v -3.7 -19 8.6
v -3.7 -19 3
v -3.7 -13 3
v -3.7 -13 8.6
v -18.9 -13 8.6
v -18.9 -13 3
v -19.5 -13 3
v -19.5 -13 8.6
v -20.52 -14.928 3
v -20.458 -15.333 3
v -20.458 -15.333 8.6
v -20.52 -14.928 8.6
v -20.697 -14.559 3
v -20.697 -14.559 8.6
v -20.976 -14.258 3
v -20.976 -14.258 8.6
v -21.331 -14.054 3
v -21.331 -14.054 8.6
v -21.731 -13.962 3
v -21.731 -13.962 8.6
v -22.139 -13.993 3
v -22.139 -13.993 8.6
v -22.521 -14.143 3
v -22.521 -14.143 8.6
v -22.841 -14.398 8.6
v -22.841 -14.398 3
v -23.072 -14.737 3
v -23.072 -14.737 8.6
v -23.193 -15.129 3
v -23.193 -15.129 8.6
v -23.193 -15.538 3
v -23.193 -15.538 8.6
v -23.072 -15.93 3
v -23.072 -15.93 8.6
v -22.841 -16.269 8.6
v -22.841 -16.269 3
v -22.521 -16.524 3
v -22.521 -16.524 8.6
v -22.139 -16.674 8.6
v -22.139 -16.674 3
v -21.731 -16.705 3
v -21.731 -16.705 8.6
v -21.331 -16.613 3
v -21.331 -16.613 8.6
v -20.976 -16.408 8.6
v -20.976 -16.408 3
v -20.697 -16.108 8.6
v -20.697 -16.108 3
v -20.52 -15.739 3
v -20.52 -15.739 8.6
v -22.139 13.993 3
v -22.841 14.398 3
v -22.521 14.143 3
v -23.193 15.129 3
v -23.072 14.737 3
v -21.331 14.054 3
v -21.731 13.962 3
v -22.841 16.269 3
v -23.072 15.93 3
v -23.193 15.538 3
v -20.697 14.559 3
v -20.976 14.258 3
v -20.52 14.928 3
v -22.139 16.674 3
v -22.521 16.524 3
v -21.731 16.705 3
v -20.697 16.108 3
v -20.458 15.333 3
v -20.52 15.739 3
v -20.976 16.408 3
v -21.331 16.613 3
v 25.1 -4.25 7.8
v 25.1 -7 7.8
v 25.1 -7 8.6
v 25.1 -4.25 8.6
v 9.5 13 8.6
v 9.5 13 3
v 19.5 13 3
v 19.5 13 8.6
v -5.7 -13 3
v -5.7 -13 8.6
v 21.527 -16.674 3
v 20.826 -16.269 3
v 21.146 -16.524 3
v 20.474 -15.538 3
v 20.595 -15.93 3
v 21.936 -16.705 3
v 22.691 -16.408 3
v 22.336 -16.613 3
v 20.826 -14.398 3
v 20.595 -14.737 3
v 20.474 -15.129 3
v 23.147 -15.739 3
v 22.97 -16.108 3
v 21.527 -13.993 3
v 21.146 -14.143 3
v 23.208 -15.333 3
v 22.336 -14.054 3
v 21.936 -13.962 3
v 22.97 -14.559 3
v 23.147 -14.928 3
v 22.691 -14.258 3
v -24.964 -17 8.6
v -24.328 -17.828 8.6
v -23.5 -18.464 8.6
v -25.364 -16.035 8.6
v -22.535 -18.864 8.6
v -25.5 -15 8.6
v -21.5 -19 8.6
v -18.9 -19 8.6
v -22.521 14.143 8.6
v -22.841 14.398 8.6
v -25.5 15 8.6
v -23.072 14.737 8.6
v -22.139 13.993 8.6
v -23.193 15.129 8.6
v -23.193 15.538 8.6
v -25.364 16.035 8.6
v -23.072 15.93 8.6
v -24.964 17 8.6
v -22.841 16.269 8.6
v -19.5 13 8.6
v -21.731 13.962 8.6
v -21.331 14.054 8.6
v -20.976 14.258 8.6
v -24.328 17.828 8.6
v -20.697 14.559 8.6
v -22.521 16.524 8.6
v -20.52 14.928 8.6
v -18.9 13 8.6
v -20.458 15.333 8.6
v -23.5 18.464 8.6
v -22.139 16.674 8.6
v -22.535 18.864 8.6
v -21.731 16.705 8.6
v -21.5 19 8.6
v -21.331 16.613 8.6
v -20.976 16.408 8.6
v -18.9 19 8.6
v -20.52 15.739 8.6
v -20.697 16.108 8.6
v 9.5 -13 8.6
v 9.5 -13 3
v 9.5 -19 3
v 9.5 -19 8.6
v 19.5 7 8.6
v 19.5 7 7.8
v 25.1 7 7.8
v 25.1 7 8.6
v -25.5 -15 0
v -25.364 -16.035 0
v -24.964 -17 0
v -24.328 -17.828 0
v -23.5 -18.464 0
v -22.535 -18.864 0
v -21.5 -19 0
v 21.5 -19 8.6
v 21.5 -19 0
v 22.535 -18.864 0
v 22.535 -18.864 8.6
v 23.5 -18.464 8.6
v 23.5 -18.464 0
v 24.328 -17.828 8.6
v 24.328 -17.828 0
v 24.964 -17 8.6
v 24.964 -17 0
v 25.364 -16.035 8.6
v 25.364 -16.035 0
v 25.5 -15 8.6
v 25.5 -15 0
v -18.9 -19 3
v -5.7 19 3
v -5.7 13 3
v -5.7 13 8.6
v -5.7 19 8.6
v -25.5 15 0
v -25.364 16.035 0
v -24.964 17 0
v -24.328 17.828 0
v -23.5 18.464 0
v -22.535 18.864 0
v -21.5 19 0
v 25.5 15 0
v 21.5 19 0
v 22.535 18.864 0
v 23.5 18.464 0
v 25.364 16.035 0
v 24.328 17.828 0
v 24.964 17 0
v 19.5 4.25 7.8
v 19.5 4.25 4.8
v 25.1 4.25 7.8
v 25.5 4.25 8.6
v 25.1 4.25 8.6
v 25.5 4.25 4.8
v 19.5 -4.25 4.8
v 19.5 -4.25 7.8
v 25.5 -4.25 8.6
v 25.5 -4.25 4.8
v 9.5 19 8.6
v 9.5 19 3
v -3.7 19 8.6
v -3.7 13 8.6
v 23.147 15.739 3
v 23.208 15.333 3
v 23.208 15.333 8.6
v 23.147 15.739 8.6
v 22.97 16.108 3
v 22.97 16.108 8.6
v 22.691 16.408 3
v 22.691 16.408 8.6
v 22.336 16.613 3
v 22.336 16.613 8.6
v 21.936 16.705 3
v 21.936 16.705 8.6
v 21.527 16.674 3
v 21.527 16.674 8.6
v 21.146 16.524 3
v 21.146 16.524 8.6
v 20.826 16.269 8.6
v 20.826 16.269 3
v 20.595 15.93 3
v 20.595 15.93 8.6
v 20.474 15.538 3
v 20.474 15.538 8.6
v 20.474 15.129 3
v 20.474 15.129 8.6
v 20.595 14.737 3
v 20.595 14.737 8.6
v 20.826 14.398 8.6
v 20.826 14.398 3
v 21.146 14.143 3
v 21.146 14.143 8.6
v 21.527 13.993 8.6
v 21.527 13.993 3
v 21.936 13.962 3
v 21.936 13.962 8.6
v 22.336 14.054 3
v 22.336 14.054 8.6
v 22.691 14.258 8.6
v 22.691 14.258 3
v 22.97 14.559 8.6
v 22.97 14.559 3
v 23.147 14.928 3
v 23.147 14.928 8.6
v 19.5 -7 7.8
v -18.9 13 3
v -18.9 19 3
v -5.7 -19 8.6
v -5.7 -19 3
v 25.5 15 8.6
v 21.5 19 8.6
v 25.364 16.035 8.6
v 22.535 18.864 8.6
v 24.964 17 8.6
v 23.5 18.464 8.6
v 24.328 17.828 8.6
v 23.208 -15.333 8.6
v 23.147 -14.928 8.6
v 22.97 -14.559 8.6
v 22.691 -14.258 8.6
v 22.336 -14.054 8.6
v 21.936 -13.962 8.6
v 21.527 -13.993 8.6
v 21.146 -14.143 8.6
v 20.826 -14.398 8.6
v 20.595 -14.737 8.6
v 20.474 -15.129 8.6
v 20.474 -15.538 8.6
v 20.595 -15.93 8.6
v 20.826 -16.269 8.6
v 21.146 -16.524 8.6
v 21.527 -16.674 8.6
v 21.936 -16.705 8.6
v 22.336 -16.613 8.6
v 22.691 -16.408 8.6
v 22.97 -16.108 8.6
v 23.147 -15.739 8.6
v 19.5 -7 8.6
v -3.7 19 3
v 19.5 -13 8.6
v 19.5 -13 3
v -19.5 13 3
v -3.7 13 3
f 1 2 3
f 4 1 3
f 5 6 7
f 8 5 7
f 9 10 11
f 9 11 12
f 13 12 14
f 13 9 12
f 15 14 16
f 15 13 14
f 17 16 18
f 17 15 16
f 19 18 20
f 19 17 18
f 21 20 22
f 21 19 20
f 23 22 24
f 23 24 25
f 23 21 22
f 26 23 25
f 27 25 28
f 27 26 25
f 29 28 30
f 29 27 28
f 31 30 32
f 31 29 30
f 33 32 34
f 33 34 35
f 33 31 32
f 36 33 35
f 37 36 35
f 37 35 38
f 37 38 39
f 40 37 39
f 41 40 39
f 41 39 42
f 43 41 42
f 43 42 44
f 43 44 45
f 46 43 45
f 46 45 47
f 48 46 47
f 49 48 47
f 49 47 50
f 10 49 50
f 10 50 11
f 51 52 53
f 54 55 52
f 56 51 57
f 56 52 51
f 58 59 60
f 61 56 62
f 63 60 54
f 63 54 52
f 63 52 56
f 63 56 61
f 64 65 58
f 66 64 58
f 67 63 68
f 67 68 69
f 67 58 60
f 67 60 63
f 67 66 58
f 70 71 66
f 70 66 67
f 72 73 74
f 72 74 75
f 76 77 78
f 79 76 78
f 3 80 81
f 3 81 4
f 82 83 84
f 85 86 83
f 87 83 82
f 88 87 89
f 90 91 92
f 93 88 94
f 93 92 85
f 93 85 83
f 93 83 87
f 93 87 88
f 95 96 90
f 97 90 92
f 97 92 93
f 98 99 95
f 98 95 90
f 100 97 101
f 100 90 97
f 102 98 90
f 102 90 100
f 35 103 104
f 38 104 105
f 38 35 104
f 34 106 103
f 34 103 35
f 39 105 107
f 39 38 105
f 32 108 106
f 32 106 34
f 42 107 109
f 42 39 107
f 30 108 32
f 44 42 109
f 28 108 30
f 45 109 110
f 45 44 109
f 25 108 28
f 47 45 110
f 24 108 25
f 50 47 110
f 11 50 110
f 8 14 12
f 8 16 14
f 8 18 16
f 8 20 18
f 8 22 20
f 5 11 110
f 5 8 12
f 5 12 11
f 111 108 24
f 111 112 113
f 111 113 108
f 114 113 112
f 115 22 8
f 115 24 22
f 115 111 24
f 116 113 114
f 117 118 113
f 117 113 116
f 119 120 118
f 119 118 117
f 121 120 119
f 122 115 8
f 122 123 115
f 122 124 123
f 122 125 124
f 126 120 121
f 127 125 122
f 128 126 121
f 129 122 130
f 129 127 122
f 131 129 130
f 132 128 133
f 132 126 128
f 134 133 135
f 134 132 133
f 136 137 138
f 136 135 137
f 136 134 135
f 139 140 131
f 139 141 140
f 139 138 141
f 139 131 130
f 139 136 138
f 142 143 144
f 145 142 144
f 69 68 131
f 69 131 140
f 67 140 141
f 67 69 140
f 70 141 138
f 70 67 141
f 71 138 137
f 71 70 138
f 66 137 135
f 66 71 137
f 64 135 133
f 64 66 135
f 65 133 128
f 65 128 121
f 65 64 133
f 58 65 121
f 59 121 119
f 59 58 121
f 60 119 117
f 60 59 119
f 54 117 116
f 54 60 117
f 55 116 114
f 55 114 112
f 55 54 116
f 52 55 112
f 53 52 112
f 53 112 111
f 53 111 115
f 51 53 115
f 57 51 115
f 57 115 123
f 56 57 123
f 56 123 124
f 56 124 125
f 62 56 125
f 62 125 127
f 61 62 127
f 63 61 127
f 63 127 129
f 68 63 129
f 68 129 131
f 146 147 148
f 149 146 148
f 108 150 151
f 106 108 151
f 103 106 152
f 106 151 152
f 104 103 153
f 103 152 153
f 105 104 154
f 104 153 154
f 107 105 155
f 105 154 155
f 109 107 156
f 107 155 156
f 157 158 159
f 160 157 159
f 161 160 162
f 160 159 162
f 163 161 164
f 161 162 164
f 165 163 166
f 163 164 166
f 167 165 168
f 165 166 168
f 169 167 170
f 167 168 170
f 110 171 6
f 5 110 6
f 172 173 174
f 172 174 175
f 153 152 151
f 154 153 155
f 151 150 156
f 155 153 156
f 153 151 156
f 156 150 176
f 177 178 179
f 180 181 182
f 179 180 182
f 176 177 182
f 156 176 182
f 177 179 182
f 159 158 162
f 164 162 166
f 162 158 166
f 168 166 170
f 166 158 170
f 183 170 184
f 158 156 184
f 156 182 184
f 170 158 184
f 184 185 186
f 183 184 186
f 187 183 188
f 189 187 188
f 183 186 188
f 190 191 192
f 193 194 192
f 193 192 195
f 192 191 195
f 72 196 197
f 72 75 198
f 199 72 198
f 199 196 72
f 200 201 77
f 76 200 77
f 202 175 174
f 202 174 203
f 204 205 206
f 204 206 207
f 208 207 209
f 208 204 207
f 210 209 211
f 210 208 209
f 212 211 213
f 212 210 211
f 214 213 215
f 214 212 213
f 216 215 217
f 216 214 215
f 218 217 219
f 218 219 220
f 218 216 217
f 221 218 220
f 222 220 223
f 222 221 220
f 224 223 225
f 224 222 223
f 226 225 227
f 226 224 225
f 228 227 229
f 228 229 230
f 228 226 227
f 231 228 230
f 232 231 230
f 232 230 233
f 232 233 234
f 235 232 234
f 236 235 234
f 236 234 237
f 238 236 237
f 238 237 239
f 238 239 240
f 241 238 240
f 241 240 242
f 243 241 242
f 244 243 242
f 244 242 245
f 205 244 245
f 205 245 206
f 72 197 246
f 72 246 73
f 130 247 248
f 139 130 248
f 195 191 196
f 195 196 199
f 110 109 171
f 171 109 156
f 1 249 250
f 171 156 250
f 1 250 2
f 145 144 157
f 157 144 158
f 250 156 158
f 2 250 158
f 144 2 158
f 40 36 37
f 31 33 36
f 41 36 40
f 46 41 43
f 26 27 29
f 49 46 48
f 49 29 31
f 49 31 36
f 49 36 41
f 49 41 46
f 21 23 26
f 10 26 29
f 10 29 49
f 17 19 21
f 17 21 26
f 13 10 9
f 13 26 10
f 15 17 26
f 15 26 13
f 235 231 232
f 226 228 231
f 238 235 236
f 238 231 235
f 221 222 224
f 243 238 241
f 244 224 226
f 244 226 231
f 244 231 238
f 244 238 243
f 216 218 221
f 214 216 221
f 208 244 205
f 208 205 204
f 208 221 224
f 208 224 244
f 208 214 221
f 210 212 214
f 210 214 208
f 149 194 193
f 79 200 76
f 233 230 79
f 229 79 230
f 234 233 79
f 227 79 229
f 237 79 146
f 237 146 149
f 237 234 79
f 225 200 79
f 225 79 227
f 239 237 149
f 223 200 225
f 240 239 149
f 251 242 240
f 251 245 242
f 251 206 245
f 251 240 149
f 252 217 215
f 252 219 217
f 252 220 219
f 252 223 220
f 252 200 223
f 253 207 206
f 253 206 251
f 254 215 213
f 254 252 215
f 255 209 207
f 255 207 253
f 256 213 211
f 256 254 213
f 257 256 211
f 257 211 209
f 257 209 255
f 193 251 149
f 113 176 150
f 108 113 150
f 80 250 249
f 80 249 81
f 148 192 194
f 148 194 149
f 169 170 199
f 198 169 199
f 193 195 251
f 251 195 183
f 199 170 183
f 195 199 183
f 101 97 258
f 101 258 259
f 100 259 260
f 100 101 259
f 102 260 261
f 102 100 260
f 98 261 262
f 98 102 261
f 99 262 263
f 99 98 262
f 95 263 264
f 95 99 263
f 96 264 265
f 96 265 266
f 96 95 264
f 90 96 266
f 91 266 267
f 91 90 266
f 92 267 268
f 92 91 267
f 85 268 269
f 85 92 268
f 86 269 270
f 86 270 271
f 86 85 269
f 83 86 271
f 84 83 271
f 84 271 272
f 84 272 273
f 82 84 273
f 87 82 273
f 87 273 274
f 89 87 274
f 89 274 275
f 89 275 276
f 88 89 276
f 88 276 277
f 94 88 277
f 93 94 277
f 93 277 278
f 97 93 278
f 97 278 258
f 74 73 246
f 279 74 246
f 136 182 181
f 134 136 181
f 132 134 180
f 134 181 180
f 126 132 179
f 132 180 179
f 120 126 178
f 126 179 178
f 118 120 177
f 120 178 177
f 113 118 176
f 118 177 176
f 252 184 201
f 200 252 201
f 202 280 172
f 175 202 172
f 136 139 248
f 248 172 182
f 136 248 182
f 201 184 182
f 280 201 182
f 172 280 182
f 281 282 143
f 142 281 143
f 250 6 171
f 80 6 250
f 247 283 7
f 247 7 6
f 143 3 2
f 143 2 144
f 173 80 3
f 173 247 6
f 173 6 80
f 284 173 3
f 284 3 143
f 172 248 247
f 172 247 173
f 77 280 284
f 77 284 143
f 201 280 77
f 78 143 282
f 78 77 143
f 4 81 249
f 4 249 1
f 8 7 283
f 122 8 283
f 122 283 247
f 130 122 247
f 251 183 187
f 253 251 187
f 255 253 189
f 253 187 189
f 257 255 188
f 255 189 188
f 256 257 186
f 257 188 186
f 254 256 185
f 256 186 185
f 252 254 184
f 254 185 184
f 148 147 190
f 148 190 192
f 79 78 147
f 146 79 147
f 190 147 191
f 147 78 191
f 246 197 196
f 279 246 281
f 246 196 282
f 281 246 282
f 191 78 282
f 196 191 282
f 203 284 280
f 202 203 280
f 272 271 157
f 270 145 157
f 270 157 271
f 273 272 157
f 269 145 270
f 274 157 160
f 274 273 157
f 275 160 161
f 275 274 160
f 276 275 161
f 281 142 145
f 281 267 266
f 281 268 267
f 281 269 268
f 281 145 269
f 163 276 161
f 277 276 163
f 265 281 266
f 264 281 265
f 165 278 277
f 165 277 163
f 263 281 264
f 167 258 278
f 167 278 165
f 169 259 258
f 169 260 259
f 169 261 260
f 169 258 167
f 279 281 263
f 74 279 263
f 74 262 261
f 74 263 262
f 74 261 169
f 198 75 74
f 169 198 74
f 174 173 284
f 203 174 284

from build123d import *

# Parameters (mm, degrees)
F0_R     = 2.6
F0_W     = 13.2
F0_H     = 6
F0_W_2   = 5.6
F0_H_2   = 8.5
F0_R_2   = 1.55
F0_H_3   = 2.75
F0_W_3   = 2
F0_R_3   = 1.375
F0_W_4   = 0.4
F1_DEPTH = 3
F2_DEPTH = 8.6
F3_DEPTH = 7.8
F4_DEPTH = 4.8


with BuildPart() as f1:
    # F0 (on Top) → F1 (new body)
    with BuildSketch(Plane.XY):
        Polygon((19.5, 13), (9.5, 13), (-3.7, 13), (-5.7, 13), (-18.9, 13), (-19.5, 13), (-19.5, -13), (-18.9, -13), (-5.7, -13), (-3.7, -13), (9.5, -13), (19.5, -13), (19.5, -7), (19.5, -4.25), (19.5, 4.25), (19.5, 7), align=None)
        with BuildLine():
            Line((-18.9, 13), (-18.9, 19))
            Line((-18.9, 19), (-21.5, 19))
            ThreePointArc((-21.5, 19), (-24.3284271247, 17.8284271247), (-25.5, 15))
            Line((-25.5, 15), (-25.5, -15))
            ThreePointArc((-25.5, -15), (-24.3284271247, -17.8284271247), (-21.5, -19))
            Line((-21.5, -19), (-18.9, -19))
            Line((-18.9, -19), (-18.9, -13))
            Line((-18.9, -13), (-19.5, -13))
            Line((-19.5, -13), (-19.5, 13))
            Line((-19.5, 13), (-18.9, 13))
        make_face()
        with Locations((-21.8334523779, -15.3334523779)):
            Circle(F0_R, mode=Mode.SUBTRACT)
        with Locations((-21.8334523779, 15.3334523779)):
            Circle(F0_R, mode=Mode.SUBTRACT)
        with BuildLine():
            Line((25.5, -15), (25.5, -7))
            Line((25.5, -7), (25.1, -7))
            Line((25.1, -7), (19.5, -7))
            Line((19.5, -7), (19.5, -13))
            Line((19.5, -13), (9.5, -13))
            Line((9.5, -13), (9.5, -19))
            Line((9.5, -19), (21.5, -19))
            ThreePointArc((21.5, -19), (24.3284271247, -17.8284271247), (25.5, -15))
        make_face()
        with Locations((21.8334523779, -15.3334523779)):
            Circle(F0_R, mode=Mode.SUBTRACT)
        with BuildLine():
            ThreePointArc((25.5, 15), (24.3284271247, 17.8284271247), (21.5, 19))
            Line((21.5, 19), (9.5, 19))
            Line((9.5, 19), (9.5, 13))
            Line((9.5, 13), (19.5, 13))
            Line((19.5, 13), (19.5, 7))
            Line((19.5, 7), (25.1, 7))
            Line((25.1, 7), (25.5, 7))
            Line((25.5, 7), (25.5, 15))
        make_face()
        with Locations((21.8334523779, 15.3334523779)):
            Circle(F0_R, mode=Mode.SUBTRACT)
        with Locations((-12.3, -16)):
            Rectangle(F0_W, F0_H)
        with Locations((2.9, 16)):
            Rectangle(F0_W, F0_H)
        with Locations((-12.3, 16)):
            Rectangle(F0_W, F0_H)
        with Locations((2.9, -16)):
            Rectangle(F0_W, F0_H)
        with Locations((22.3, 0)):
            Rectangle(F0_W_2, F0_H_2)
        with Locations((-21.8334523779, -15.3334523779)):
            Circle(F0_R)
        with Locations((-21.8334523779, -15.3334523779)):
            Circle(F0_R_2, mode=Mode.SUBTRACT)
        with Locations((21.8334523779, 15.3334523779)):
            Circle(F0_R)
        with Locations((21.8334523779, 15.3334523779)):
            Circle(F0_R_2, mode=Mode.SUBTRACT)
        with Locations((-21.8334523779, 15.3334523779)):
            Circle(F0_R)
        with Locations((-21.8334523779, 15.3334523779)):
            Circle(F0_R_2, mode=Mode.SUBTRACT)
        with Locations((21.8334523779, -15.3334523779)):
            Circle(F0_R)
        with Locations((21.8334523779, -15.3334523779)):
            Circle(F0_R_2, mode=Mode.SUBTRACT)
        with Locations((22.3, 5.625)):
            Rectangle(F0_W_2, F0_H_3)
        with Locations((22.3, -5.625)):
            Rectangle(F0_W_2, F0_H_3)
        with Locations((-4.7, -16)):
            Rectangle(F0_W_3, F0_H)
        with Locations((-4.7, 16)):
            Rectangle(F0_W_3, F0_H)
        with Locations((21.8334523779, 15.3334523779)):
            Circle(F0_R_2)
        with Locations((21.8334523779, 15.3334523779)):
            Circle(F0_R_3, mode=Mode.SUBTRACT)
        with Locations((-21.8334523779, -15.3334523779)):
            Circle(F0_R_2)
        with Locations((-21.8334523779, -15.3334523779)):
            Circle(F0_R_3, mode=Mode.SUBTRACT)
        with Locations((21.8334523779, -15.3334523779)):
            Circle(F0_R_2)
        with Locations((21.8334523779, -15.3334523779)):
            Circle(F0_R_3, mode=Mode.SUBTRACT)
        with Locations((-21.8334523779, 15.3334523779)):
            Circle(F0_R_2)
        with Locations((-21.8334523779, 15.3334523779)):
            Circle(F0_R_3, mode=Mode.SUBTRACT)
        with Locations((-21.8334523779, -15.3334523779)):
            Circle(F0_R_3)
        with Locations((-21.8334523779, 15.3334523779)):
            Circle(F0_R_3)
        with Locations((21.8334523779, -15.3334523779)):
            Circle(F0_R_3)
        with Locations((21.8334523779, 15.3334523779)):
            Circle(F0_R_3)
        with Locations((25.3, 0)):
            Rectangle(F0_W_4, F0_H_2)
        with Locations((25.3, 5.625)):
            Rectangle(F0_W_4, F0_H_3)
        with Locations((25.3, -5.625)):
            Rectangle(F0_W_4, F0_H_3)
    extrude(amount=F1_DEPTH)

    # F0 (on Top) → F2 (join)
    with BuildSketch(Plane.XY):
        with BuildLine():
            Line((-18.9, 13), (-18.9, 19))
            Line((-18.9, 19), (-21.5, 19))
            ThreePointArc((-21.5, 19), (-24.3284271247, 17.8284271247), (-25.5, 15))
            Line((-25.5, 15), (-25.5, -15))
            ThreePointArc((-25.5, -15), (-24.3284271247, -17.8284271247), (-21.5, -19))
            Line((-21.5, -19), (-18.9, -19))
            Line((-18.9, -19), (-18.9, -13))
            Line((-18.9, -13), (-19.5, -13))
            Line((-19.5, -13), (-19.5, 13))
            Line((-19.5, 13), (-18.9, 13))
        make_face()
        with Locations((-21.8334523779, -15.3334523779)):
            Circle(F0_R, mode=Mode.SUBTRACT)
        with Locations((-21.8334523779, 15.3334523779)):
            Circle(F0_R, mode=Mode.SUBTRACT)
        with BuildLine():
            ThreePointArc((25.5, 15), (24.3284271247, 17.8284271247), (21.5, 19))
            Line((21.5, 19), (9.5, 19))
            Line((9.5, 19), (9.5, 13))
            Line((9.5, 13), (19.5, 13))
            Line((19.5, 13), (19.5, 7))
            Line((19.5, 7), (25.1, 7))
            Line((25.1, 7), (25.5, 7))
            Line((25.5, 7), (25.5, 15))
        make_face()
        with Locations((21.8334523779, 15.3334523779)):
            Circle(F0_R, mode=Mode.SUBTRACT)
        with BuildLine():
            Line((25.5, -15), (25.5, -7))
            Line((25.5, -7), (25.1, -7))
            Line((25.1, -7), (19.5, -7))
            Line((19.5, -7), (19.5, -13))
            Line((19.5, -13), (9.5, -13))
            Line((9.5, -13), (9.5, -19))
            Line((9.5, -19), (21.5, -19))
            ThreePointArc((21.5, -19), (24.3284271247, -17.8284271247), (25.5, -15))
        make_face()
        with Locations((21.8334523779, -15.3334523779)):
            Circle(F0_R, mode=Mode.SUBTRACT)
        with Locations((21.8334523779, -15.3334523779)):
            Circle(F0_R)
        with Locations((21.8334523779, -15.3334523779)):
            Circle(F0_R_2, mode=Mode.SUBTRACT)
        with Locations((-21.8334523779, -15.3334523779)):
            Circle(F0_R)
        with Locations((-21.8334523779, -15.3334523779)):
            Circle(F0_R_2, mode=Mode.SUBTRACT)
        with Locations((-21.8334523779, 15.3334523779)):
            Circle(F0_R)
        with Locations((-21.8334523779, 15.3334523779)):
            Circle(F0_R_2, mode=Mode.SUBTRACT)
        with Locations((21.8334523779, 15.3334523779)):
            Circle(F0_R)
        with Locations((21.8334523779, 15.3334523779)):
            Circle(F0_R_2, mode=Mode.SUBTRACT)
        with Locations((-4.7, -16)):
            Rectangle(F0_W_3, F0_H)
        with Locations((-4.7, 16)):
            Rectangle(F0_W_3, F0_H)
        with Locations((21.8334523779, -15.3334523779)):
            Circle(F0_R_2)
        with Locations((21.8334523779, -15.3334523779)):
            Circle(F0_R_3, mode=Mode.SUBTRACT)
        with Locations((-21.8334523779, -15.3334523779)):
            Circle(F0_R_2)
        with Locations((-21.8334523779, -15.3334523779)):
            Circle(F0_R_3, mode=Mode.SUBTRACT)
        with Locations((-21.8334523779, 15.3334523779)):
            Circle(F0_R_2)
        with Locations((-21.8334523779, 15.3334523779)):
            Circle(F0_R_3, mode=Mode.SUBTRACT)
        with Locations((21.8334523779, 15.3334523779)):
            Circle(F0_R_2)
        with Locations((21.8334523779, 15.3334523779)):
            Circle(F0_R_3, mode=Mode.SUBTRACT)
        with Locations((25.3, 5.625)):
            Rectangle(F0_W_4, F0_H_3)
        with Locations((25.3, -5.625)):
            Rectangle(F0_W_4, F0_H_3)
    extrude(amount=F2_DEPTH)

    # F0 (on Top) → F3 (join)
    with BuildSketch(Plane.XY):
        with Locations((22.3, -5.625)):
            Rectangle(F0_W_2, F0_H_3)
        with Locations((22.3, 5.625)):
            Rectangle(F0_W_2, F0_H_3)
    extrude(amount=F3_DEPTH)

    # F0 (on Top) → F4 (join)
    with BuildSketch(Plane.XY):
        with Locations((22.3, 0)):
            Rectangle(F0_W_2, F0_H_2)
        with Locations((25.3, 0)):
            Rectangle(F0_W_4, F0_H_2)
    extrude(amount=F4_DEPTH)


solid = f1.part
